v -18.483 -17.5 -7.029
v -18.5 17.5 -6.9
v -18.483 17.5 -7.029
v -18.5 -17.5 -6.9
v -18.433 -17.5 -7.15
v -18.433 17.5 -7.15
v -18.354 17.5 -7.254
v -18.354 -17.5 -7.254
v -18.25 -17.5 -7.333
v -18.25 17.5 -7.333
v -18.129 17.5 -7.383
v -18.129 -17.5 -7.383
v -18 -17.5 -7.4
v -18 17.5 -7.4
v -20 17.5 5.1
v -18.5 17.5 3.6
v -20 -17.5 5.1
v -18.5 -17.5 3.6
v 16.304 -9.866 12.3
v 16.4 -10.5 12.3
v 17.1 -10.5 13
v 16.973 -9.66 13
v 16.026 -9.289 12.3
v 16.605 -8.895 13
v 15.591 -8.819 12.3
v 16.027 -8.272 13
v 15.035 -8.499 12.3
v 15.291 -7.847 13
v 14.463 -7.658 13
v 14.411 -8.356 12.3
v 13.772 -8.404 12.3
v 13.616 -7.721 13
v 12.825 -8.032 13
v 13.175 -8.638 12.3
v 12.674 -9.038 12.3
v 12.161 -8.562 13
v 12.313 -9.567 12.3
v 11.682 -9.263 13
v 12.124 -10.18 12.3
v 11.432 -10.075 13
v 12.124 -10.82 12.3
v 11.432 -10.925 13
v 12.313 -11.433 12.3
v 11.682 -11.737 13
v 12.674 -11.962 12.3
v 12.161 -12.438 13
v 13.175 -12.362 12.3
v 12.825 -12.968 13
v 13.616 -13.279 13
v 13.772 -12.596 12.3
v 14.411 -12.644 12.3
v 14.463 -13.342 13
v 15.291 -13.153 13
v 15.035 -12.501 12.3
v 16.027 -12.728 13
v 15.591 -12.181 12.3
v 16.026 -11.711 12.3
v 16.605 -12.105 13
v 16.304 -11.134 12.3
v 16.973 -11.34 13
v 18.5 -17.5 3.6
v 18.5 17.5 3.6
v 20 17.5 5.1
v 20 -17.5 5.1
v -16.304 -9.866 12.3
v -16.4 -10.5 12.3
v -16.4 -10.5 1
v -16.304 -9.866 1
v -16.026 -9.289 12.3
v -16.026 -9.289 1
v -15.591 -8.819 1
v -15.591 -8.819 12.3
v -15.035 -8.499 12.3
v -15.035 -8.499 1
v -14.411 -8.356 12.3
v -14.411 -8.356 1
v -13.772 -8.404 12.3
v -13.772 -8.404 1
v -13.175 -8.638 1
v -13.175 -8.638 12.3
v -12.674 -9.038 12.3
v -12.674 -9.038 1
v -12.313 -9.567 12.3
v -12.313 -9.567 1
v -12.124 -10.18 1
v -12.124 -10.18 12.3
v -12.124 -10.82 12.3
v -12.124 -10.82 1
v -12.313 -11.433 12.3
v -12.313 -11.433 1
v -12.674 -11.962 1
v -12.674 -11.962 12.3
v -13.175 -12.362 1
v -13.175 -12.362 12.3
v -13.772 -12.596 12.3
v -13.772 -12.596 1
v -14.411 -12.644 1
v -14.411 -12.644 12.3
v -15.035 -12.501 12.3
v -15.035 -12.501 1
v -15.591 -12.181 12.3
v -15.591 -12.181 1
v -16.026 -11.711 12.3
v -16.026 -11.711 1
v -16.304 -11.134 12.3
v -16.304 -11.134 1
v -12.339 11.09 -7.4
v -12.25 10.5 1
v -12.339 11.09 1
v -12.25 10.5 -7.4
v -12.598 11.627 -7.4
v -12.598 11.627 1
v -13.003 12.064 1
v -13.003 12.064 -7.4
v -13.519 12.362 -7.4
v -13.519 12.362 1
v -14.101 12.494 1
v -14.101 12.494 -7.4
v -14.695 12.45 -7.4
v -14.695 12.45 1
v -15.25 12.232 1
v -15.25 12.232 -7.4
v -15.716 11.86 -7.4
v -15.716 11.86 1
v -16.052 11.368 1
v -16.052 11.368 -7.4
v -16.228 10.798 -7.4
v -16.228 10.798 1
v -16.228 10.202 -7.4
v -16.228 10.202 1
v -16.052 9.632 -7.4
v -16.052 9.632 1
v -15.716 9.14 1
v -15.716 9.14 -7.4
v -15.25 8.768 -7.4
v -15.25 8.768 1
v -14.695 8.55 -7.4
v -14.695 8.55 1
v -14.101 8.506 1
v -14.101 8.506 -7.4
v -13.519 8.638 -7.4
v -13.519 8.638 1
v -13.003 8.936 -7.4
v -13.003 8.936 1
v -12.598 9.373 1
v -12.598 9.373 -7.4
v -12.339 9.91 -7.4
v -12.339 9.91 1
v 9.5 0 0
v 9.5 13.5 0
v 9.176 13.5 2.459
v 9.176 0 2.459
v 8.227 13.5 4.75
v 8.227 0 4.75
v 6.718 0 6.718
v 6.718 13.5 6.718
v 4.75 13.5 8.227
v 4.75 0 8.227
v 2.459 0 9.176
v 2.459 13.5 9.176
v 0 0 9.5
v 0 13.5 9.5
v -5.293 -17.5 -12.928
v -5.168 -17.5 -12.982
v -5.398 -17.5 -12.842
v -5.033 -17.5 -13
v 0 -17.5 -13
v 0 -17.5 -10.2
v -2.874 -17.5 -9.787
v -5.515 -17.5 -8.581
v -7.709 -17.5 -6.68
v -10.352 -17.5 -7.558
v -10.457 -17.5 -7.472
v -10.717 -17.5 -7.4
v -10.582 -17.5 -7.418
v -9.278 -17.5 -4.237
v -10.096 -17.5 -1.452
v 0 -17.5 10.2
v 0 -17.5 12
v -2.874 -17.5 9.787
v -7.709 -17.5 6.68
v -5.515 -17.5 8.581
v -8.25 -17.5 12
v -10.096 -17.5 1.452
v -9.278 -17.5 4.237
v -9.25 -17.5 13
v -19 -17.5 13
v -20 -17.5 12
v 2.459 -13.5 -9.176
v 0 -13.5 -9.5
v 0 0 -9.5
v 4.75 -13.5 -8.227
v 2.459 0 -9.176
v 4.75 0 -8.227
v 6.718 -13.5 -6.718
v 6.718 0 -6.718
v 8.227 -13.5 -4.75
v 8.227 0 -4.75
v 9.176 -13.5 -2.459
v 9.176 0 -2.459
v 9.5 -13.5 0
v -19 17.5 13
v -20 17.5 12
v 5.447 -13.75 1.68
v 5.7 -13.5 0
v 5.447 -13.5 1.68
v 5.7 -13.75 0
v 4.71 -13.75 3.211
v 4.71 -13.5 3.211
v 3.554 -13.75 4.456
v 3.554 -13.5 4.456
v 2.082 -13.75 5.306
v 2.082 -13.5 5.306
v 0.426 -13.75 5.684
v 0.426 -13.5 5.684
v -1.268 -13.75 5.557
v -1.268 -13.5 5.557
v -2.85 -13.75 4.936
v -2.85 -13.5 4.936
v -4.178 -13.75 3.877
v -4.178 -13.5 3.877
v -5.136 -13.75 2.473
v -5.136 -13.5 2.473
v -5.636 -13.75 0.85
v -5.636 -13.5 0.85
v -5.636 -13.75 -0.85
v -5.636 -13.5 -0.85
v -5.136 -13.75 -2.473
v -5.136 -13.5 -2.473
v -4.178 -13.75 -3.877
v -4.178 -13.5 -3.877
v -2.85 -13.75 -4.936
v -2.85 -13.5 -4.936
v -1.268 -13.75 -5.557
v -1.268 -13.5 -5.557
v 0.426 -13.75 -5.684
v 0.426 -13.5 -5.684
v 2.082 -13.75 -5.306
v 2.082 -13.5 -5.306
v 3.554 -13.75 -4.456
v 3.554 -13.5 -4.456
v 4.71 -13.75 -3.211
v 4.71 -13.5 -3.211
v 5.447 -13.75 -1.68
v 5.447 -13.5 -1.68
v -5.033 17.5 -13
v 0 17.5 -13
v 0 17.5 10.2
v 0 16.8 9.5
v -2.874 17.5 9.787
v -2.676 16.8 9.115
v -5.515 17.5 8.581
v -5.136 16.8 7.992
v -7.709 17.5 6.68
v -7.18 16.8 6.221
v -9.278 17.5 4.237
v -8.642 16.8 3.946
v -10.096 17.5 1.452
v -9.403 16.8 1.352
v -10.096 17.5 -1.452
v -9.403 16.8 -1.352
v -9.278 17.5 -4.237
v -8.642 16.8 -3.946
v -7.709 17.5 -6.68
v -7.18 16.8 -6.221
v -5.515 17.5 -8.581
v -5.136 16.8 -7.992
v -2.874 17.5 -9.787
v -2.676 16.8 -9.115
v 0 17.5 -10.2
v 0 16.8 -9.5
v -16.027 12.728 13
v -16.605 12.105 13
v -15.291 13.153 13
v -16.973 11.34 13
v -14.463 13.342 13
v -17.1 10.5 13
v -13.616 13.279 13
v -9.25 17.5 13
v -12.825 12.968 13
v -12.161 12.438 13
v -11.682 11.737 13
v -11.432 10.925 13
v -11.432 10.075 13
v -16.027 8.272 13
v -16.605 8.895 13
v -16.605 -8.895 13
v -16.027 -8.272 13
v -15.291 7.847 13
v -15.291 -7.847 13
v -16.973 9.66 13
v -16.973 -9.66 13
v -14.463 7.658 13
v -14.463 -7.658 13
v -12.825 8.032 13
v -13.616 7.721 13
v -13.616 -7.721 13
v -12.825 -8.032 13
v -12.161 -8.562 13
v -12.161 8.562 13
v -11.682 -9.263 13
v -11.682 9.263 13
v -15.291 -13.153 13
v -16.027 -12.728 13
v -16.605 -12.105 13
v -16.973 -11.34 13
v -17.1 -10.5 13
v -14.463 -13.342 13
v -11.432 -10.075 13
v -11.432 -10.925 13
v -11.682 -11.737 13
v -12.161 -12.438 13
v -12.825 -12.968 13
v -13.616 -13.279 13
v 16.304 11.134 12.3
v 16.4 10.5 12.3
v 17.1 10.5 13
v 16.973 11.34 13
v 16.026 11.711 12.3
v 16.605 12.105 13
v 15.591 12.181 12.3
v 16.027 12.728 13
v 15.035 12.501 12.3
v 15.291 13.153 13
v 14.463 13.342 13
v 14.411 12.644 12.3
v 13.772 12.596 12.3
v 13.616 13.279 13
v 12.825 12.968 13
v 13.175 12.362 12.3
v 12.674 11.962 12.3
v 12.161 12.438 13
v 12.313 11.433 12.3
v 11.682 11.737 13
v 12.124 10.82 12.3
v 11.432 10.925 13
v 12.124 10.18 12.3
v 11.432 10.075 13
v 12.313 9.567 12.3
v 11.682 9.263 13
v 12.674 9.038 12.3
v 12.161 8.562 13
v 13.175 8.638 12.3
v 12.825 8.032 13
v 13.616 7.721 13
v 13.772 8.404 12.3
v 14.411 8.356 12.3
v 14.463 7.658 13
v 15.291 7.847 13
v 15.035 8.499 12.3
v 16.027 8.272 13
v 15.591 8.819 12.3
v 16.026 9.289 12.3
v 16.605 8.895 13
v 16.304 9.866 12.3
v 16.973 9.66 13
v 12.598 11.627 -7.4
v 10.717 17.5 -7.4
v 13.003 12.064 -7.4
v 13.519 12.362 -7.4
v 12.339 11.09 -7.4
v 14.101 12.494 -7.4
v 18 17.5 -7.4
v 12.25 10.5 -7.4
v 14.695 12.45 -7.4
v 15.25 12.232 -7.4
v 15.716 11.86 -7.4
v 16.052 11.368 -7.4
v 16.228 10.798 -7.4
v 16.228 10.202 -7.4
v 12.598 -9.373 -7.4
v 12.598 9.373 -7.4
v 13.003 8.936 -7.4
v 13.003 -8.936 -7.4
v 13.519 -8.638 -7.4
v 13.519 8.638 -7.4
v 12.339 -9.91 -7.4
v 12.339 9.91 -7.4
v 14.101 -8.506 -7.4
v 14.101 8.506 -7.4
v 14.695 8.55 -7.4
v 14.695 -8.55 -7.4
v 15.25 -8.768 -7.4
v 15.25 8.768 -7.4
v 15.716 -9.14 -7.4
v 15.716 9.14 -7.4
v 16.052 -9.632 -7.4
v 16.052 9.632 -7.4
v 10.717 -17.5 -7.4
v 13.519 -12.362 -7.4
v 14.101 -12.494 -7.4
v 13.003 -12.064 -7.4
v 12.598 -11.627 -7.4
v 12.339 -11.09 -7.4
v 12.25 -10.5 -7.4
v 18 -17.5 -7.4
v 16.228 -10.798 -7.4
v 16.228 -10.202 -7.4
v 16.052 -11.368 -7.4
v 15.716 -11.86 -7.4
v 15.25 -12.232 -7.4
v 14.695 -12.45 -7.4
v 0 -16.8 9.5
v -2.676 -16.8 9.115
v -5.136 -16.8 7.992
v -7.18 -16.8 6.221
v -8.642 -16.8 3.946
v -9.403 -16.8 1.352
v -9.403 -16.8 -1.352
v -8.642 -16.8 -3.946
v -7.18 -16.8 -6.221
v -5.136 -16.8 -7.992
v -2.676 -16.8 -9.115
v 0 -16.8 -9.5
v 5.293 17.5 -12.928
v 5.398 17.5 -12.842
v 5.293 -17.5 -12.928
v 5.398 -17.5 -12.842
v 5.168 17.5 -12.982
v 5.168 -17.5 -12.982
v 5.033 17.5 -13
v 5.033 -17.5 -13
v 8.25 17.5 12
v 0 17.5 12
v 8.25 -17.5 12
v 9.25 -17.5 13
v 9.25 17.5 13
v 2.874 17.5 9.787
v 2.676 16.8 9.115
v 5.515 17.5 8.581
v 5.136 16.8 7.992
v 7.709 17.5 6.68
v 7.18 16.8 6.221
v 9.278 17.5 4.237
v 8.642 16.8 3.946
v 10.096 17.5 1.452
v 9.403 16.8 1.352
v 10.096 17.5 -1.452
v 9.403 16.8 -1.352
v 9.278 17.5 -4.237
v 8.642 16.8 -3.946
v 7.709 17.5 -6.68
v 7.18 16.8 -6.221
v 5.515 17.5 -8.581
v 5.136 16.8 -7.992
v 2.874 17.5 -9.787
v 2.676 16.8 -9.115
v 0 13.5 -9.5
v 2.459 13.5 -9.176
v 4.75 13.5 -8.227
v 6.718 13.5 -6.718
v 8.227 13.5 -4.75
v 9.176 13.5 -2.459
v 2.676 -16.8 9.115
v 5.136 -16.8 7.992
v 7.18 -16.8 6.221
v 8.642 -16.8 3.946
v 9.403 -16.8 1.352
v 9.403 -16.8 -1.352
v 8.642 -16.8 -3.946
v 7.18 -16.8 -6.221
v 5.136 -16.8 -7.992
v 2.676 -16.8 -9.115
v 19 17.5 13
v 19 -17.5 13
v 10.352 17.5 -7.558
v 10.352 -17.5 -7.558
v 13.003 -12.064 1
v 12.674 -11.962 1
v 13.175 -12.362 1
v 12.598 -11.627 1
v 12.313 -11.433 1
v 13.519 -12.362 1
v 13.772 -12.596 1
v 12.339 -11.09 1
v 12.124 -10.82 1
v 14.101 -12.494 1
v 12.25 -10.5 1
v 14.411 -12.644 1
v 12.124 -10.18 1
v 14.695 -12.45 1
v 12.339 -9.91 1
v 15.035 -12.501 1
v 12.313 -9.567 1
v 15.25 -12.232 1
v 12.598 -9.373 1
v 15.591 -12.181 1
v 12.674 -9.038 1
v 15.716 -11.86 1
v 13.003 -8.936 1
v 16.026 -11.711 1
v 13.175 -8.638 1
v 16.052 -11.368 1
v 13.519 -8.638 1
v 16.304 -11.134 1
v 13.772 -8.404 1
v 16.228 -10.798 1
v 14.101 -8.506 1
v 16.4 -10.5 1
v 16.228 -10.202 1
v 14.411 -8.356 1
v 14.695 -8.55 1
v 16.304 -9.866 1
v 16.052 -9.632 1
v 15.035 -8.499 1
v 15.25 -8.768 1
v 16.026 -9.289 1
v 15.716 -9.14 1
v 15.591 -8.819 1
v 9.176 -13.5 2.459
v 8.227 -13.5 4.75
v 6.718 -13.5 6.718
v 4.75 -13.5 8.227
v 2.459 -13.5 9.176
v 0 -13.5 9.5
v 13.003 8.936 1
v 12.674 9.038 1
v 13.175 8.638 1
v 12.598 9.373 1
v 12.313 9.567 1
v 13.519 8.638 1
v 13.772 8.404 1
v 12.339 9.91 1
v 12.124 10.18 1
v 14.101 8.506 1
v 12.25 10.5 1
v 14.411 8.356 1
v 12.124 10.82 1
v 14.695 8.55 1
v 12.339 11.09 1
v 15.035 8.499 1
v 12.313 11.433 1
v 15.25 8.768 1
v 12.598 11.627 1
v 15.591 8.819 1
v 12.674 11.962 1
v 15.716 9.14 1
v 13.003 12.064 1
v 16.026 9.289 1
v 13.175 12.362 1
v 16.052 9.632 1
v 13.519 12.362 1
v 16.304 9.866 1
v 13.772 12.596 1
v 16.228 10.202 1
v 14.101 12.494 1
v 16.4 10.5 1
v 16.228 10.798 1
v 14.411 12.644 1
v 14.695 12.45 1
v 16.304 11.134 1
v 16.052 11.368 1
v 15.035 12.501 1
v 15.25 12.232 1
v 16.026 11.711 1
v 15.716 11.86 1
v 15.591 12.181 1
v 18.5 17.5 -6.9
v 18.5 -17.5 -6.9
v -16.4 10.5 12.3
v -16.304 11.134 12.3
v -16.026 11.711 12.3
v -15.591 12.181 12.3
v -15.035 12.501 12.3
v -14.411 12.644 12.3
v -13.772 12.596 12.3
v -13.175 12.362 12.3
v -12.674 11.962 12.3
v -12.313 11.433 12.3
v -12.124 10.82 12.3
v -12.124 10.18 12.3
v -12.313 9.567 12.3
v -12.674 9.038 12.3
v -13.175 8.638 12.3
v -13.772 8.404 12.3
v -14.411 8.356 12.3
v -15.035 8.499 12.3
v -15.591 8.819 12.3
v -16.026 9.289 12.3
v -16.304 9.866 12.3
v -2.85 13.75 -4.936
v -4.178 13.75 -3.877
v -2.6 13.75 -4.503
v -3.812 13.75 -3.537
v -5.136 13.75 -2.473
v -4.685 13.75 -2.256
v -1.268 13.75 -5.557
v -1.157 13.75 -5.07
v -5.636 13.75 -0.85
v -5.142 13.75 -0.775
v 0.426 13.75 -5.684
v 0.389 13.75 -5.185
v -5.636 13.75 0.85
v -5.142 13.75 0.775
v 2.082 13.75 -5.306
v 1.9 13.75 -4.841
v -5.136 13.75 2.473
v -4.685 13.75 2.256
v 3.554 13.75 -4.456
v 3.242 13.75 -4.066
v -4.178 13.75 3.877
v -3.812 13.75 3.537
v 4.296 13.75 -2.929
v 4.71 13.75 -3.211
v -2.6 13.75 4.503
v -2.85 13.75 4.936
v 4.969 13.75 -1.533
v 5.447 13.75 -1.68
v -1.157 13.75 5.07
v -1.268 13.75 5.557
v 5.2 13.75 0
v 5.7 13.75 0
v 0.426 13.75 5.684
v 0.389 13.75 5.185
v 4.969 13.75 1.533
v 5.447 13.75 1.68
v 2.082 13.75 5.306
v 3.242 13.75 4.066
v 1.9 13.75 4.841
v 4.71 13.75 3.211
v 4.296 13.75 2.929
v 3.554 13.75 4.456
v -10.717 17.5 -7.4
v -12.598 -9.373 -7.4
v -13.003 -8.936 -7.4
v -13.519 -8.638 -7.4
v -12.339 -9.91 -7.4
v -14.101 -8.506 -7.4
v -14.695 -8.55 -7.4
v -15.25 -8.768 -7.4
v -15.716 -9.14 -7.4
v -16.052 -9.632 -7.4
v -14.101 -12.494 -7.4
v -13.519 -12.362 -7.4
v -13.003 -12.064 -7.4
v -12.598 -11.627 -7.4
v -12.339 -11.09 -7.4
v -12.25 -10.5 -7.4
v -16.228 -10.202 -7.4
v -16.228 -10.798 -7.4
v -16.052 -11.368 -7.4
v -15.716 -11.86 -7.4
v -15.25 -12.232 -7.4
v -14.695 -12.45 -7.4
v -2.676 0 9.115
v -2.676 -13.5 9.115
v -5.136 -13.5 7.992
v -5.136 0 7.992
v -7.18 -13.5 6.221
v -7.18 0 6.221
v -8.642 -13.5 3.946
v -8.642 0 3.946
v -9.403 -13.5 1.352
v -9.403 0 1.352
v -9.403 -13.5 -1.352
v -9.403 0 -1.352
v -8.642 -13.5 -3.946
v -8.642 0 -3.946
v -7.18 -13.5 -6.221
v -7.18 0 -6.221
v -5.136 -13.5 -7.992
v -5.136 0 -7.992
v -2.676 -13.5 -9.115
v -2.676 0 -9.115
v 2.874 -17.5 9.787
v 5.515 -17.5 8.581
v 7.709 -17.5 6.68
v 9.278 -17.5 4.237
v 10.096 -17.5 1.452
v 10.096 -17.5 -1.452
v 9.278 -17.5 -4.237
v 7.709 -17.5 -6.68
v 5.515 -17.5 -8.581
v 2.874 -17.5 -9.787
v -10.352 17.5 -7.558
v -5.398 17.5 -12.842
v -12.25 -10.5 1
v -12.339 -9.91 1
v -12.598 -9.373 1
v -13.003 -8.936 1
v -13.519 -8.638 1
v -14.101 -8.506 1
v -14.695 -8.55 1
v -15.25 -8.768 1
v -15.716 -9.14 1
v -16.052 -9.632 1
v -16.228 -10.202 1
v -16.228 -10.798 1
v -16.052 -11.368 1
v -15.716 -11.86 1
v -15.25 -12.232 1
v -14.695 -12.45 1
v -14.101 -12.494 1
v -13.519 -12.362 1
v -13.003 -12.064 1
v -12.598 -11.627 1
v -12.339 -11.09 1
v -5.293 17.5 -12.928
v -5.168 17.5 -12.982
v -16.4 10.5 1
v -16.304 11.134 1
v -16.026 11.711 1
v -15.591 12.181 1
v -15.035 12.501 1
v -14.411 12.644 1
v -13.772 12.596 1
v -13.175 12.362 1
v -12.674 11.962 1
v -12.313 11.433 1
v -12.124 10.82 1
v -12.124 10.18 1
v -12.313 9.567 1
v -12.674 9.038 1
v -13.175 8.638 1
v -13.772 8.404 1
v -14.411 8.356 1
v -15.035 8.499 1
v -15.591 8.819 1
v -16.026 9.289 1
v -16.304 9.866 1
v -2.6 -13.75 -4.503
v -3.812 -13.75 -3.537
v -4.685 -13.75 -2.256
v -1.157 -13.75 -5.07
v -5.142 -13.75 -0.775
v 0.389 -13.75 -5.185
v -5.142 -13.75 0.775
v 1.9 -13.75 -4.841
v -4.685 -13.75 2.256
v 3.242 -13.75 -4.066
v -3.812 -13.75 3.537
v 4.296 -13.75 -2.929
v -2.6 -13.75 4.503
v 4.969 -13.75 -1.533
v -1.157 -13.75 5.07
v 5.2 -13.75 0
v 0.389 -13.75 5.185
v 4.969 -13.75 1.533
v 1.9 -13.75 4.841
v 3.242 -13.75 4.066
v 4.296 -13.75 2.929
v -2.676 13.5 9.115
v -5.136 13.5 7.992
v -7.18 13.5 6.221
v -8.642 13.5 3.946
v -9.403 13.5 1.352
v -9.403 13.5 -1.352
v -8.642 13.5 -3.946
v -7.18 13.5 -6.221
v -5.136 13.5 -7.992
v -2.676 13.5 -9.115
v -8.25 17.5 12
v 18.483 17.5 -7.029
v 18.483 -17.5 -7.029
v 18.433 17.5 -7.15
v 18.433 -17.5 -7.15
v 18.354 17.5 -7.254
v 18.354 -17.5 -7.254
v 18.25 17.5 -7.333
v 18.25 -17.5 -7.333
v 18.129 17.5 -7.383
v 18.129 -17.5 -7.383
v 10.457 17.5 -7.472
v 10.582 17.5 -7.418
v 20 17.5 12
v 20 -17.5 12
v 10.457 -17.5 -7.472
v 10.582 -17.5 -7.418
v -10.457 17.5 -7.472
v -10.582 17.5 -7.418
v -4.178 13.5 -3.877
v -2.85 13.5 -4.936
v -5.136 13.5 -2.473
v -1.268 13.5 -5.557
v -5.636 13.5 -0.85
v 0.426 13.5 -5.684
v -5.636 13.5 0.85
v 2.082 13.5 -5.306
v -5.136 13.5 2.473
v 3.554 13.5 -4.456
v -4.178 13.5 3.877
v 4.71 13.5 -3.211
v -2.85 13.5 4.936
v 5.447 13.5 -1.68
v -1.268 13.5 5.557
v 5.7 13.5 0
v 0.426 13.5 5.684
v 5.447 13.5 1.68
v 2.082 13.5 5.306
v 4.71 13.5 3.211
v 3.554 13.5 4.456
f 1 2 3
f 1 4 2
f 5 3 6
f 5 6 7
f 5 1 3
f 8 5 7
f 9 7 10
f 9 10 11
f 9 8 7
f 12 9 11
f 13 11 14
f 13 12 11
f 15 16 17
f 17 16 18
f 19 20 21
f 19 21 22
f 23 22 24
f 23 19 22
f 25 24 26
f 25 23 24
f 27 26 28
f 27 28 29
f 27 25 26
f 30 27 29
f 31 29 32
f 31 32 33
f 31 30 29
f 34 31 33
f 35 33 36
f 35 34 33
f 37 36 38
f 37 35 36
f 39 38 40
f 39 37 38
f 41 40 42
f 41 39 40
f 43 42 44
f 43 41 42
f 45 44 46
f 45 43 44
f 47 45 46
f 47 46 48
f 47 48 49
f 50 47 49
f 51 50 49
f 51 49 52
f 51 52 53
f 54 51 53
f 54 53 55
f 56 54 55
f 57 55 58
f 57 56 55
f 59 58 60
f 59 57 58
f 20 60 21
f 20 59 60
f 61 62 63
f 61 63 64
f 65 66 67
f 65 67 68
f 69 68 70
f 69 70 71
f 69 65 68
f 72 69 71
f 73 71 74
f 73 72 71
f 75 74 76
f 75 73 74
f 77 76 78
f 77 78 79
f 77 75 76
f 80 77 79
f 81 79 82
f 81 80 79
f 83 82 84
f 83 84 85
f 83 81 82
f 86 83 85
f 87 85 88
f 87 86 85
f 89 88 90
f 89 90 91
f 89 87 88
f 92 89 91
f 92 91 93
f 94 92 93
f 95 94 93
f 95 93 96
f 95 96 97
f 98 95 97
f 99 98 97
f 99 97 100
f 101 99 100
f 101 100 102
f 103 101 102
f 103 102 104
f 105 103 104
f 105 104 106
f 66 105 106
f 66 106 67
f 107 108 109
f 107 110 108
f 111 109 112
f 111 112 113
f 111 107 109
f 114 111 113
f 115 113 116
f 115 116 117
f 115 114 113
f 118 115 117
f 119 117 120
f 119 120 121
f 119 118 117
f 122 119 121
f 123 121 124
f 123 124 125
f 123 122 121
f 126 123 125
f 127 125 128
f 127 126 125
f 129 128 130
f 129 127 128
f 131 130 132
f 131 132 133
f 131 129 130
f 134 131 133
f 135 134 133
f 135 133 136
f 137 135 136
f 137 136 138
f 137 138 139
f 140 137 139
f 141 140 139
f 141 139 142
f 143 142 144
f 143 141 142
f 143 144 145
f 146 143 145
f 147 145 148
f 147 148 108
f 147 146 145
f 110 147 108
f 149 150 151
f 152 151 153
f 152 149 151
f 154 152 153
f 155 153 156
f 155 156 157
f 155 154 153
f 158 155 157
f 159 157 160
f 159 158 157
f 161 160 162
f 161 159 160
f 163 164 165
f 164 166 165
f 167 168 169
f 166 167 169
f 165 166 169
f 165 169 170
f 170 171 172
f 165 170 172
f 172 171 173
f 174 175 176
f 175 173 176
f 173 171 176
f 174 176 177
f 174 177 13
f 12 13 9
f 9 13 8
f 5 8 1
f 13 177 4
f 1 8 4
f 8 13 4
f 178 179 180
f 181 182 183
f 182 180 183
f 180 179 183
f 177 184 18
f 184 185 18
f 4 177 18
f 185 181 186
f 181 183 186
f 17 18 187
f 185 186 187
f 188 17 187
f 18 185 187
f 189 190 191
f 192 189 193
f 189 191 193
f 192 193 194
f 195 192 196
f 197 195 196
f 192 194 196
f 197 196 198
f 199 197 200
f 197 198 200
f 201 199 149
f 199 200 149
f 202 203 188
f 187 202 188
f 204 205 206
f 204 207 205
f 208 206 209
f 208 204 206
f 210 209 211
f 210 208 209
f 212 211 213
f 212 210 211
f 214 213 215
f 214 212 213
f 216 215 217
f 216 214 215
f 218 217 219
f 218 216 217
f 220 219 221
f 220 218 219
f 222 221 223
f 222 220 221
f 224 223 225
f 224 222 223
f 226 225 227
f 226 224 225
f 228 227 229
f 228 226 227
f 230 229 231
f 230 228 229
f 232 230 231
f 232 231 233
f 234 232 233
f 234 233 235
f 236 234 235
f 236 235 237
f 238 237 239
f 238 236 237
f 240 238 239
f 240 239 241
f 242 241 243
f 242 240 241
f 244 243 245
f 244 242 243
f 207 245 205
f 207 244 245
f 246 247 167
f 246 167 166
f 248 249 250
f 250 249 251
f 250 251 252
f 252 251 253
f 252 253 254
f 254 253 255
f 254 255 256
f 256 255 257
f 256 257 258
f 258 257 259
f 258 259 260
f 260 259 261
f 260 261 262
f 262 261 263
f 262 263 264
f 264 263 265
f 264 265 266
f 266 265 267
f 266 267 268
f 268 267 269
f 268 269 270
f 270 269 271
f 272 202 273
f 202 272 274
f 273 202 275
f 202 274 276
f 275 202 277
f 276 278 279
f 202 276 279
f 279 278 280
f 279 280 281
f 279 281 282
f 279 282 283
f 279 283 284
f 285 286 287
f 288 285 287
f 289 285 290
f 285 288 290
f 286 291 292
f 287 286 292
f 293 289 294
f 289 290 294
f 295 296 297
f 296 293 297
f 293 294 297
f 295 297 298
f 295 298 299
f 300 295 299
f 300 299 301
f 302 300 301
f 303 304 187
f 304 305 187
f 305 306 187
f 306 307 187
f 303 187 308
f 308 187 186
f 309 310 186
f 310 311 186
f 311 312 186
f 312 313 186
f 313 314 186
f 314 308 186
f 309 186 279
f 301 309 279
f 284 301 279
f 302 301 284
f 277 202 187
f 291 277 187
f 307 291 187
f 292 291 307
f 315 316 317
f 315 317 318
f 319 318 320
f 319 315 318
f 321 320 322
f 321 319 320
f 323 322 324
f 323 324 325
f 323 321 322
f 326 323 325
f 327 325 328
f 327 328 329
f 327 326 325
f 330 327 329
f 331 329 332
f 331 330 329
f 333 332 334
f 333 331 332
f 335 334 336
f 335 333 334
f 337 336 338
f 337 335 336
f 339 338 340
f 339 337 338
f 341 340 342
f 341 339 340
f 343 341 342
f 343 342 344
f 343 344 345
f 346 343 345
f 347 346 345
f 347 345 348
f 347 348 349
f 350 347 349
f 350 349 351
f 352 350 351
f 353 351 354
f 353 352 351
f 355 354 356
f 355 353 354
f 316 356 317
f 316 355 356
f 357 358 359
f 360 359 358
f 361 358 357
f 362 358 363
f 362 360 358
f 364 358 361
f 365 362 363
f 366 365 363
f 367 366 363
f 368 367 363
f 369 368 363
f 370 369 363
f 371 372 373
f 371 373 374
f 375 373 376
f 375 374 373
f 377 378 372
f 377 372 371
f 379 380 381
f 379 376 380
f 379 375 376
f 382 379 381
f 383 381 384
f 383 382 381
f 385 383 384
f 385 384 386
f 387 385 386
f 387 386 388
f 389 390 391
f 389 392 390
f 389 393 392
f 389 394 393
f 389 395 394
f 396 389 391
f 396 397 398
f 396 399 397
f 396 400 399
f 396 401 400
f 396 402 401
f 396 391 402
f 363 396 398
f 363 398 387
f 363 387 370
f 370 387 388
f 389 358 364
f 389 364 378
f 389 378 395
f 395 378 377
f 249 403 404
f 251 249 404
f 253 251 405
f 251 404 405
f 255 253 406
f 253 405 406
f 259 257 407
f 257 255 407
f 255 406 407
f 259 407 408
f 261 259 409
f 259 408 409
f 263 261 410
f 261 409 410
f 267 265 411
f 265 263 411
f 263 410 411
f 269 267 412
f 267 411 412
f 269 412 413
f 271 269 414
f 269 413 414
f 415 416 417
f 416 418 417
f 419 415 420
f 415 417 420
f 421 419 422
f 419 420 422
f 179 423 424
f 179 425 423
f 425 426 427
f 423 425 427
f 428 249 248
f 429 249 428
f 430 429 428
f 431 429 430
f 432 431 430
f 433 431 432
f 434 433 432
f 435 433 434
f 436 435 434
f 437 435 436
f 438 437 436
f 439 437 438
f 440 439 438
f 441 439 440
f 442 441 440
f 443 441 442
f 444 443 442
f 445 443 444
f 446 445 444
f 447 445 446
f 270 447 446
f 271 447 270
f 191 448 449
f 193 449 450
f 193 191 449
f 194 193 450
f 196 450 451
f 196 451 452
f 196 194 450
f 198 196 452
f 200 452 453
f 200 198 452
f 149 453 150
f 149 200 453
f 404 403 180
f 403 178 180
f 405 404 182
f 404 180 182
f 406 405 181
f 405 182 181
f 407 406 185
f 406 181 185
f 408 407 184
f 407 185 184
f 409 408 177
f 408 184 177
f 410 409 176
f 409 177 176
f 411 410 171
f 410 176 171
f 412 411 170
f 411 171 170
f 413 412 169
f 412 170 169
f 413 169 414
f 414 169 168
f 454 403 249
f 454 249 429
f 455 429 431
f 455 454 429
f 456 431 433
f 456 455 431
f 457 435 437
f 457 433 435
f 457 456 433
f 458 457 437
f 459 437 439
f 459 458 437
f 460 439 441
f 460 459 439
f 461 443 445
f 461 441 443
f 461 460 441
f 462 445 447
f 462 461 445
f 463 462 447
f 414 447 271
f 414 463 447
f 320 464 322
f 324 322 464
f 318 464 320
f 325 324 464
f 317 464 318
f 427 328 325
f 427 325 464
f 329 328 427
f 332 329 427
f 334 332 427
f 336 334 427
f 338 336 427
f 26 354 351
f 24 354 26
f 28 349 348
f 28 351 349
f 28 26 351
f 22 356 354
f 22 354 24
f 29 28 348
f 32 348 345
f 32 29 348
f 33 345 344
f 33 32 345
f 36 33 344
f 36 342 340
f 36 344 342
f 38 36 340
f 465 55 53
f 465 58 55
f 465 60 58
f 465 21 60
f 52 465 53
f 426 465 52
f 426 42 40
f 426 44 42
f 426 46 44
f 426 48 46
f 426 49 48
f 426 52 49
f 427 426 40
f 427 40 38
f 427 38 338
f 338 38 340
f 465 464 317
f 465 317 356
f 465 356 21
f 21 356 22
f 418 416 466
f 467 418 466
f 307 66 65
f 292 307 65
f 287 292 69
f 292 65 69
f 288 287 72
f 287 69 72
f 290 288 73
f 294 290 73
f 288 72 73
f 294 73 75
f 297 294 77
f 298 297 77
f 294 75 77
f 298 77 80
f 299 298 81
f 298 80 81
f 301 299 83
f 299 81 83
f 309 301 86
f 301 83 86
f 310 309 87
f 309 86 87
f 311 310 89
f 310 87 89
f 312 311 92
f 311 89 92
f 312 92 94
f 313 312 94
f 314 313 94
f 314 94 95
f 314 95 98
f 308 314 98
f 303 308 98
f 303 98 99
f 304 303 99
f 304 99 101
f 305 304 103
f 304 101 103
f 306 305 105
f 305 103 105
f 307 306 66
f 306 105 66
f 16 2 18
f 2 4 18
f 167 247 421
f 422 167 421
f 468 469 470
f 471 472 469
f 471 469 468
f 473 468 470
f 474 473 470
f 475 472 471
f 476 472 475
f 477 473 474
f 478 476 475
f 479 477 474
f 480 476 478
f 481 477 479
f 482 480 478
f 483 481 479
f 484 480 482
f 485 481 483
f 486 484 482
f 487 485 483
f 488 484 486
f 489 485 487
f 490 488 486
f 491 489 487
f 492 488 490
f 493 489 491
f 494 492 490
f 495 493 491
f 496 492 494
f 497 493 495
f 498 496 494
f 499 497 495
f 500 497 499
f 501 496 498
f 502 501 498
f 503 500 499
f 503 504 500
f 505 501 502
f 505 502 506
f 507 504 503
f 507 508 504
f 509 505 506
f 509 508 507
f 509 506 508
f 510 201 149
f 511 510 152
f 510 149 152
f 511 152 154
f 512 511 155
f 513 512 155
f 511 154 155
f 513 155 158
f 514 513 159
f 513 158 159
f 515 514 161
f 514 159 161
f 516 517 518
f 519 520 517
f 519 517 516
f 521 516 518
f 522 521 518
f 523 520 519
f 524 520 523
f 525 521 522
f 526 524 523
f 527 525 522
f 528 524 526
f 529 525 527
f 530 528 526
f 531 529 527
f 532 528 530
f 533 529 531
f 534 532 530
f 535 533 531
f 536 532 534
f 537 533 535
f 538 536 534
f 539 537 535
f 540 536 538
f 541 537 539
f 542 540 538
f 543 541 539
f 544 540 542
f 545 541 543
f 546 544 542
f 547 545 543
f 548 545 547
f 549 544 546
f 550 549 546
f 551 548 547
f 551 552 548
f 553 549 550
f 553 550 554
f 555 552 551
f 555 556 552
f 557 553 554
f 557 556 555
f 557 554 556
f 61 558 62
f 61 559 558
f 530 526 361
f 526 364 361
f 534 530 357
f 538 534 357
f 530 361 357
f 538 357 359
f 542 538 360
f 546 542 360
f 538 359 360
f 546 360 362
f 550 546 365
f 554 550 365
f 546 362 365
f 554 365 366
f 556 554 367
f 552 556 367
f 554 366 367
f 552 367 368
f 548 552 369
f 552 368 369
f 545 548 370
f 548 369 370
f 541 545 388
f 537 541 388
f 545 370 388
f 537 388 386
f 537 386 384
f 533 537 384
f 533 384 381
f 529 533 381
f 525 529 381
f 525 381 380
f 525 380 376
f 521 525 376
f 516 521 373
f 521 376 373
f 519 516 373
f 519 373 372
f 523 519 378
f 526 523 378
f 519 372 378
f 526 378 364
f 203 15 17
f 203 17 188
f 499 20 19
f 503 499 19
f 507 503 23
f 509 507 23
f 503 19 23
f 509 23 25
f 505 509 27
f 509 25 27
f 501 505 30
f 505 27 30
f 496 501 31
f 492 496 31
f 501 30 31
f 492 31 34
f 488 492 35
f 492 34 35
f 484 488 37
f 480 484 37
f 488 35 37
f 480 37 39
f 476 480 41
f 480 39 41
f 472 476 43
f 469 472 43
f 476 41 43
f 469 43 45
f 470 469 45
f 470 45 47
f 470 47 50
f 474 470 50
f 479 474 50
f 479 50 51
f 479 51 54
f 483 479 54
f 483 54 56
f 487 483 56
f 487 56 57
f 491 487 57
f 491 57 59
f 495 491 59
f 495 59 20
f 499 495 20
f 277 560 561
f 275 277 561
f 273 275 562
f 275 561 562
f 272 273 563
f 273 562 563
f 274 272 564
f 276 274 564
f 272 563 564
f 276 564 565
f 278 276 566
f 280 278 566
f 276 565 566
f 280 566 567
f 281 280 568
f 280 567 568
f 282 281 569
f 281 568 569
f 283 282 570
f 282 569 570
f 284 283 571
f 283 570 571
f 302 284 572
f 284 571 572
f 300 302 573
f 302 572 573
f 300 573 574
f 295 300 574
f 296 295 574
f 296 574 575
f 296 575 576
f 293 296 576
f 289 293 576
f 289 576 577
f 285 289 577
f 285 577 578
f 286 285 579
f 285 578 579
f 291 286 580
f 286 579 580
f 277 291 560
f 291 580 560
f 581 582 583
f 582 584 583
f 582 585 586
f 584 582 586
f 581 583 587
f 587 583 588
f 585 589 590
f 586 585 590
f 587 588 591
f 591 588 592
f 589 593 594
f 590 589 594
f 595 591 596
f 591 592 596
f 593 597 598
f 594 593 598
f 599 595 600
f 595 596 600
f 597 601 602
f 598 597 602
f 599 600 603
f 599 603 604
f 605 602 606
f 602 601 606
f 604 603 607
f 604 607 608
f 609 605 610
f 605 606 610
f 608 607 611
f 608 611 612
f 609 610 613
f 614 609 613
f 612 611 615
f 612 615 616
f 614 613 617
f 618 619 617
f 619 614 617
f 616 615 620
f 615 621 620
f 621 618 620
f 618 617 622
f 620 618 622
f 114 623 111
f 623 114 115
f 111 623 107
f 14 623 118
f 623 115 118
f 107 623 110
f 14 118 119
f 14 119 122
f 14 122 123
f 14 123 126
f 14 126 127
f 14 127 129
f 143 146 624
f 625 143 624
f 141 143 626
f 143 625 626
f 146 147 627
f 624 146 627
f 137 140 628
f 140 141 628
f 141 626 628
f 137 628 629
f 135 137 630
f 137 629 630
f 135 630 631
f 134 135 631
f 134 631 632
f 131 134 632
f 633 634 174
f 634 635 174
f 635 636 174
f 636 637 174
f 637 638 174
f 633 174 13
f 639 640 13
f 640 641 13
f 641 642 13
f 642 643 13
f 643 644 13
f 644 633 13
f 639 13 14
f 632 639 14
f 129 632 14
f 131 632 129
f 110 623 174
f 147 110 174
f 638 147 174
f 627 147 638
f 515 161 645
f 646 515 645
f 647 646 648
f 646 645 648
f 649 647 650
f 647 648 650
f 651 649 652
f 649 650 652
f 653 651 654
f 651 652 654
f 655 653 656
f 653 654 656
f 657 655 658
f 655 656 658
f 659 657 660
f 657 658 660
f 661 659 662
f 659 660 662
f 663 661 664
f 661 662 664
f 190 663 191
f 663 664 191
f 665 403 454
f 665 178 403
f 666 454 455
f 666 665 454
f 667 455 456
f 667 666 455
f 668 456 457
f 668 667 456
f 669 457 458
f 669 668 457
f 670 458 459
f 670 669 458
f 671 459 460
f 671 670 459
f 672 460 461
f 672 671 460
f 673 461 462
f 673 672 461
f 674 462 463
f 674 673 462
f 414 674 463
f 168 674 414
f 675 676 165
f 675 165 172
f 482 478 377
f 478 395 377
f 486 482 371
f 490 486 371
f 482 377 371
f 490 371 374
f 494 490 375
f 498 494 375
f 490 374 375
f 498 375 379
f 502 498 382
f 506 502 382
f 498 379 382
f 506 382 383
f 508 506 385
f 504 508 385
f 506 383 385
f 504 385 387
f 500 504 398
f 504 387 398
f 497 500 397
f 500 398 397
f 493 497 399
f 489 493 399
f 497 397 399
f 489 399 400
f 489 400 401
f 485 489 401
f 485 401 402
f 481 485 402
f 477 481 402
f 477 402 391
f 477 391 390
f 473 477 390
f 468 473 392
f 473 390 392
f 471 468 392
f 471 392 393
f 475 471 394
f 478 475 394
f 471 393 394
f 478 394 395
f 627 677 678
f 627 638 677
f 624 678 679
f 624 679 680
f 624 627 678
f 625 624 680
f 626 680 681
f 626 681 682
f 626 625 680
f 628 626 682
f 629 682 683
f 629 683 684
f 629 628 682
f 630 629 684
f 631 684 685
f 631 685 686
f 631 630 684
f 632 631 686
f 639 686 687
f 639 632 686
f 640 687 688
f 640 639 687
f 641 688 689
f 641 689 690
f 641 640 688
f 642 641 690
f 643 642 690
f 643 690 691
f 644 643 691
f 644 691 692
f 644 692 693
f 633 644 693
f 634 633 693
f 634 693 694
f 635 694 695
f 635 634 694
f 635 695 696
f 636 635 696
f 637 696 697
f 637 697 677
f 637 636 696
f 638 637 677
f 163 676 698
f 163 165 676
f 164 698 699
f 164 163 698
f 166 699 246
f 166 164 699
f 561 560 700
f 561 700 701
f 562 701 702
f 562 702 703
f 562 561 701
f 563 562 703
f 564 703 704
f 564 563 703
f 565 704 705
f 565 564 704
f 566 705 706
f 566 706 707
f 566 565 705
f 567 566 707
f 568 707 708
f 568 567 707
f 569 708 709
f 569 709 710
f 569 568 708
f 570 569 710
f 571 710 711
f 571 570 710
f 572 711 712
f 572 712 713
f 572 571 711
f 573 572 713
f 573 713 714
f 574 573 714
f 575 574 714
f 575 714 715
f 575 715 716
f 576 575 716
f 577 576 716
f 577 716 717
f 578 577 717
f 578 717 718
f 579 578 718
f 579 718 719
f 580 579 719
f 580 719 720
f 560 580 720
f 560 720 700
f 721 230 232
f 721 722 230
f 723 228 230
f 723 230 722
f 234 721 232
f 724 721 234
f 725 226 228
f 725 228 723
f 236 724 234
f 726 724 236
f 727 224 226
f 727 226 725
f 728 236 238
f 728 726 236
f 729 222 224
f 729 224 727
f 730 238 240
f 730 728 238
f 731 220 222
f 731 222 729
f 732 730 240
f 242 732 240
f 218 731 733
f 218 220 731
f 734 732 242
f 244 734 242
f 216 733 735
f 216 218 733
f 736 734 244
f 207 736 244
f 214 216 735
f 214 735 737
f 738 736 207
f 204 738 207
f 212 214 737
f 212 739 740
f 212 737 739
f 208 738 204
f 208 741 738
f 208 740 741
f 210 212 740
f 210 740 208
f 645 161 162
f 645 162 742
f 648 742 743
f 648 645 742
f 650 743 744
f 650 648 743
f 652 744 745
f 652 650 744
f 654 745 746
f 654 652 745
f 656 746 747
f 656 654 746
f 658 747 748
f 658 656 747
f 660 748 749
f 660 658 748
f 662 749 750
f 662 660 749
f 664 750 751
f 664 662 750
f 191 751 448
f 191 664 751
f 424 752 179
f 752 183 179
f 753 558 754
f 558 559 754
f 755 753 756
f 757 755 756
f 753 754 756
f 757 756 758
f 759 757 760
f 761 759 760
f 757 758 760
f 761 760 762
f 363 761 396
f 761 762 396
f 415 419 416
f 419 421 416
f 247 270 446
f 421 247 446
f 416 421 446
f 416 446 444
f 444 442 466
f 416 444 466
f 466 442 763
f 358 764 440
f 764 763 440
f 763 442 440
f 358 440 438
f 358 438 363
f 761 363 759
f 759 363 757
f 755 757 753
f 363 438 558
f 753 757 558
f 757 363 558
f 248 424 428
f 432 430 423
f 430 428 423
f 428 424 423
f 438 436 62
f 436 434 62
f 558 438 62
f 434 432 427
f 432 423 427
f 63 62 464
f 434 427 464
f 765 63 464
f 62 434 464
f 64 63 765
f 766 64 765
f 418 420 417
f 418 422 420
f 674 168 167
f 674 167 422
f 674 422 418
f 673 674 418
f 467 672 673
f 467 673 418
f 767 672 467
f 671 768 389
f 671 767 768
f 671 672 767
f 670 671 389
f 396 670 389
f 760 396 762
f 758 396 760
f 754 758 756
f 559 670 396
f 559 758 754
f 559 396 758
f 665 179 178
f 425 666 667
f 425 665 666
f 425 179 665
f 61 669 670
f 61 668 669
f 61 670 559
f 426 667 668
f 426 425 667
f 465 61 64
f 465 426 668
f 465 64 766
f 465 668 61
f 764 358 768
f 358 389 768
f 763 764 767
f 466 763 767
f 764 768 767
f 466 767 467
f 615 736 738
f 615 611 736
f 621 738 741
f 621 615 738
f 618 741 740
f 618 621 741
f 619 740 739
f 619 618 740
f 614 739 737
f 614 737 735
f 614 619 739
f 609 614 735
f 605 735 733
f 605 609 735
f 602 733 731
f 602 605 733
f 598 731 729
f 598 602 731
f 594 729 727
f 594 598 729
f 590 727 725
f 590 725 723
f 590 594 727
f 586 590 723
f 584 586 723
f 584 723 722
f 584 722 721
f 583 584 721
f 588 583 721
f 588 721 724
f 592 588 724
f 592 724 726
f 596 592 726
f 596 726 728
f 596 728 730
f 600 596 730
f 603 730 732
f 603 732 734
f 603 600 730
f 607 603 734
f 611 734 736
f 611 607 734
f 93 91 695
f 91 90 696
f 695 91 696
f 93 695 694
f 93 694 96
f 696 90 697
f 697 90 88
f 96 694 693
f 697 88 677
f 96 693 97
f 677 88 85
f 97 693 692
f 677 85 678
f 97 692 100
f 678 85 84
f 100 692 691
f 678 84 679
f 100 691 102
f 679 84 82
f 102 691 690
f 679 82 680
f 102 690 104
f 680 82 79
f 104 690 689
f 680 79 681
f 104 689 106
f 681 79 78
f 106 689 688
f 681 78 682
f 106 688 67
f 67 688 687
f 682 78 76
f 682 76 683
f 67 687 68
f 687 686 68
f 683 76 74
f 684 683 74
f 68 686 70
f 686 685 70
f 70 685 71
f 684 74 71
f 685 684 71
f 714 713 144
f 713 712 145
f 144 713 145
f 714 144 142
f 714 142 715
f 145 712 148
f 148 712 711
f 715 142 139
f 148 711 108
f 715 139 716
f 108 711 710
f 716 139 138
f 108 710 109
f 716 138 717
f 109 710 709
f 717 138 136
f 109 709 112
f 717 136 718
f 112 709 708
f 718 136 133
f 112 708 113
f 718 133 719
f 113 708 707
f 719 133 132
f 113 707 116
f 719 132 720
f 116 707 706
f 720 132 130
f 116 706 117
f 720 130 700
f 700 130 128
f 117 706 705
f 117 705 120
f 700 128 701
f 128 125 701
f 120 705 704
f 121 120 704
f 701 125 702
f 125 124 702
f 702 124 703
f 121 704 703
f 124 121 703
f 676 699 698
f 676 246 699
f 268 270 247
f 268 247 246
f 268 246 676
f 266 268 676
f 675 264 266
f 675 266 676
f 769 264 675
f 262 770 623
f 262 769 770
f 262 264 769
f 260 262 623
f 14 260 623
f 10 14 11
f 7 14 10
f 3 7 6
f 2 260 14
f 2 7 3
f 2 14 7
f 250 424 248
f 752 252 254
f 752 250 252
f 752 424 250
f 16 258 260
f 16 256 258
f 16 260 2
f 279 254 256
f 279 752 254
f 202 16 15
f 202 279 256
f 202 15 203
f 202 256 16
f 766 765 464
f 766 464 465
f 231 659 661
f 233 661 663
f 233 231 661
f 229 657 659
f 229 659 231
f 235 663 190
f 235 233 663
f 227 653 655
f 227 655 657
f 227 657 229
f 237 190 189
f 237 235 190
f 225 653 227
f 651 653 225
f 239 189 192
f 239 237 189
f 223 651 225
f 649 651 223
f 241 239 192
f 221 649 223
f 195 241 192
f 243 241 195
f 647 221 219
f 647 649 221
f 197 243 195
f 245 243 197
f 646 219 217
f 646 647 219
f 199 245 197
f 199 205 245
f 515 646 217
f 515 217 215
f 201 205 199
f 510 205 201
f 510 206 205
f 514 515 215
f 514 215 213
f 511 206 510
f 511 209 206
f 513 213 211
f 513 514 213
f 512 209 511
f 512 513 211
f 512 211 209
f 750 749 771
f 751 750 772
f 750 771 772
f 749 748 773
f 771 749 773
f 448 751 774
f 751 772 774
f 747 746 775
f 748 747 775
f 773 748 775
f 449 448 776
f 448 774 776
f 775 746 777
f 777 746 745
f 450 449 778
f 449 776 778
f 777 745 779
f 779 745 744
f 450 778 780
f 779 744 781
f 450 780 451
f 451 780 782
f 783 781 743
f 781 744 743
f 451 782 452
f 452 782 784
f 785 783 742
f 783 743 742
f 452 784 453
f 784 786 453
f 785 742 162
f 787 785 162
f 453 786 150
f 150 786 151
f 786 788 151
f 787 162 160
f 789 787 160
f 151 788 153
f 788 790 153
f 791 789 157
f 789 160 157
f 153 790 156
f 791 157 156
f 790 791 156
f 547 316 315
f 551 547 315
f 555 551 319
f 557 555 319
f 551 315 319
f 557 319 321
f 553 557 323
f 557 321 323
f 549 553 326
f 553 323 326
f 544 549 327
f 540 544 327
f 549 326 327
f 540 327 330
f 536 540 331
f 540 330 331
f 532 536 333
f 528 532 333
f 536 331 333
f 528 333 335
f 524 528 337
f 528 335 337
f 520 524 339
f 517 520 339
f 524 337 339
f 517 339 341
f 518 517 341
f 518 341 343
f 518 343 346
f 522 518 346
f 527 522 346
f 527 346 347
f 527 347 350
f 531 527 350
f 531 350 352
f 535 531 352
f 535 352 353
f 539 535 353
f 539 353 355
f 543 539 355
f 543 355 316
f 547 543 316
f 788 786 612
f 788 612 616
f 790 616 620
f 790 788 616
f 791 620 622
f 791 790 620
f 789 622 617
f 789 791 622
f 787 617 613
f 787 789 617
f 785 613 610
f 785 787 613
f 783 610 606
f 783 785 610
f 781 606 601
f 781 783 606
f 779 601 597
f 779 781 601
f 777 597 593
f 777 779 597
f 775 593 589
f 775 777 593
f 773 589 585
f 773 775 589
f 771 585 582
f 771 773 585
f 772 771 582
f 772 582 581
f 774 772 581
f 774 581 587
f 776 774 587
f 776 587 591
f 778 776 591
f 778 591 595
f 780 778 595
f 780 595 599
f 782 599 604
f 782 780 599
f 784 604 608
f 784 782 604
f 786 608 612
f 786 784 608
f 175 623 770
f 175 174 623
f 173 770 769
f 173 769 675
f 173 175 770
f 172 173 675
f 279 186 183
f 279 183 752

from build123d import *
from build123d import SkipClean  # not in build123d's __all__

# Parameters (mm, degrees)
F1_DEPTH       = 17.5
F2_SIZE        = 0.99999
F3_SIZE        = 1.49999
F4_R           = 0.5
F6_D           = 4
F6_CBORE_D     = 4.3
F6_CBORE_DEPTH = 12
F7_SIZE        = 0.7
F0_R           = 5.7
F8_DEPTH       = 13.5
F0_R_2         = 5.2
F9_DEPTH       = 13.75


# Not quite as in the source:
# - a fillet or chamfer is up to 0.001 mm smaller than in the source, because OpenCascade refuses the exact size


with BuildPart() as f1:
    # F0 (on Front) → F1 (new body, symmetric)
    with BuildSketch(Plane.XZ):
        with BuildLine():
            ThreePointArc((0, 9.5), (6.7175144213, 6.7175144213), (9.5, 0))
            ThreePointArc((9.5, 0), (6.7175144213, -6.7175144213), (0, -9.5))
            Line((0, -9.5), (0, -13))
            Line((0, -13), (5.25, -13))
            Line((5.25, -13), (10.5, -7.4))
            Line((10.5, -7.4), (18.5, -7.4))
            Line((18.5, -7.4), (18.5, 3.6))
            Line((18.5, 3.6), (20, 3.6))
            Line((20, 3.6), (20, 13))
            Line((20, 13), (9.25, 13))
            Line((9.25, 13), (9.25, 12))
            Line((9.25, 12), (0, 12))
            Line((0, 12), (0, 9.5))
        make_face()
    extrude(amount=F1_DEPTH, both=True)

    # F2 (size 1 in the source; OpenCascade refuses exactly that, so slightly less here)
    f2_edges = [f1.edges().sort_by_distance(p)[0] for p in [
        (9.25, 0, 12),
        (20, 0, 13),
    ]]
    chamfer(f2_edges, length=F2_SIZE)

    # F3 (size 1.5 in the source; OpenCascade refuses exactly that, so slightly less here)
    f3_edges = [f1.edges().sort_by_distance(p)[0] for p in [
        (20, 0, 3.6),
    ]]
    chamfer(f3_edges, length=F3_SIZE)

    # F4
    f4_edges = [f1.edges().sort_by_distance(p)[0] for p in [
        (18.5, 0, -7.4),
        (10.5, 0, -7.4),
        (5.25, 0, -13),
    ]]
    fillet(f4_edges, radius=F4_R)

    # F6 (through all)
    with Locations(Plane.XY.offset(13)):
        with Locations((14.25, 10.5), (14.25, -10.5)):
            CounterBoreHole(F6_D / 2, F6_CBORE_D / 2, F6_CBORE_DEPTH)

    # F7
    f7_edges = [f1.edges().sort_by_distance(p)[0] for p in [
        (9.5, -17.5, 0),
        (9.5, 17.5, 0),
        (12.1, 10.5, 13),
        (12.1, -10.5, 13),
    ]]
    chamfer(f7_edges, length=F7_SIZE)

    # F10: F1 across plane


with BuildPart() as f8:
    # F0 (on Front) → F8 (new body, symmetric)
    with BuildSketch(Plane.XZ):
        with BuildLine():
            ThreePointArc((0, -9.5), (6.7175144213, -6.7175144213), (9.5, 0))
            ThreePointArc((9.5, 0), (6.7175144213, 6.7175144213), (0, 9.5))
            ThreePointArc((0, 9.5), (-9.5, 0), (0, -9.5))
        make_face()
        Circle(F0_R, mode=Mode.SUBTRACT)
    extrude(amount=F8_DEPTH, both=True)

    # F0 (on Front) → F9 (join, symmetric)
    with BuildSketch(Plane.XZ):
        Circle(F0_R)
        Circle(F0_R_2, mode=Mode.SUBTRACT)
    extrude(amount=F9_DEPTH, both=True)


with BuildPart() as f1_1:
    add(f1.part, clean=False)
    with SkipClean():  # cleaning this boolean's faces spoils the solid; the shape is the same uncleaned
        add(f1.part.mirror(Plane.YZ), clean=False)


solid = Compound([f8.part, f1_1.part])
